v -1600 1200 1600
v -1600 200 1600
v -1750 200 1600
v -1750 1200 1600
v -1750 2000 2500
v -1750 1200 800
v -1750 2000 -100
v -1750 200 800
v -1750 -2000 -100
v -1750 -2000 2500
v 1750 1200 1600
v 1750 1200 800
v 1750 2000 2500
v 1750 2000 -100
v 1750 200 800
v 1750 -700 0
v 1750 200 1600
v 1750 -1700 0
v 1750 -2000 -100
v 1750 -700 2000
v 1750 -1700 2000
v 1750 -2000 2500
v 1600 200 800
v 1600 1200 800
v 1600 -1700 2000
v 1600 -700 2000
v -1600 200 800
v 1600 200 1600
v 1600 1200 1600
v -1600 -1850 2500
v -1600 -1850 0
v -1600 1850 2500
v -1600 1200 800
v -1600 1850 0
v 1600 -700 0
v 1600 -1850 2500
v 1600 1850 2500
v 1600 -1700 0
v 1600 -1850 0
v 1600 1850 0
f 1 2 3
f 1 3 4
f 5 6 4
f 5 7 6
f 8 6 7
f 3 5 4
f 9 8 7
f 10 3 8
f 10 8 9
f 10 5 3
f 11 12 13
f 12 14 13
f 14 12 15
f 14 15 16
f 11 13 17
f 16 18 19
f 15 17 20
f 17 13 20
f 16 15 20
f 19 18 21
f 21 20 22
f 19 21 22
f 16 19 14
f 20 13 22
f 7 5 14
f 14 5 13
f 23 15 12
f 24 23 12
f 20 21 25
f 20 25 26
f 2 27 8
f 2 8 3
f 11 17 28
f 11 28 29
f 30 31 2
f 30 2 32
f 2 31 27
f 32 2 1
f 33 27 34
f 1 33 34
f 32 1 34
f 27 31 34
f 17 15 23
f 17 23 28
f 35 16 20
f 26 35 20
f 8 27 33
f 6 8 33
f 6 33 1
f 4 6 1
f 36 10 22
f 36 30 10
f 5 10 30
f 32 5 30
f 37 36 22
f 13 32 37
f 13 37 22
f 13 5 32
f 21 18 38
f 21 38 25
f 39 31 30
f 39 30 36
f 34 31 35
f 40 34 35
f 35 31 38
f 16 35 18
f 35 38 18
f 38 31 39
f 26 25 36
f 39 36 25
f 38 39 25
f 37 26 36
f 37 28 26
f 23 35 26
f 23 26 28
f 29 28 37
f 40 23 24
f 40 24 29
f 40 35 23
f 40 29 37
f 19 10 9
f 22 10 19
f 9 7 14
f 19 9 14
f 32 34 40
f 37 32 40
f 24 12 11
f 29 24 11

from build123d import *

# Parameters (mm, degrees)
F0_W     = 3500
F0_H     = 4000
F0_W_2   = 3200
F0_H_2   = 3700
F1_DEPTH = 2500
F2_W     = 1000
F2_H     = 2000
F3_DEPTH = 150
F4_W     = 1000
F4_H     = 800
F5_DEPTH = 3500.001
F6_W     = 3500
F6_H     = 4000
F7_DEPTH = 100


with BuildPart() as f1:
    # F0 (on Top) → F1 (new body)
    with BuildSketch(Plane.XY):
        Rectangle(F0_W, F0_H)
        Rectangle(F0_W_2, F0_H_2, mode=Mode.SUBTRACT)
    extrude(amount=F1_DEPTH)

    # F2 (on face) → F3 (cut, through all)
    with BuildSketch(Plane.YZ.offset(1750)):
        with Locations((-1200, 1000)):
            Rectangle(F2_W, F2_H)
    extrude(amount=-F3_DEPTH, mode=Mode.SUBTRACT)

    # F4 (on face) → F5 (cut, through all)
    with BuildSketch(Plane.YZ.offset(1750)):
        with Locations((700, 1200)):
            Rectangle(F4_W, F4_H)
    extrude(amount=-F5_DEPTH, mode=Mode.SUBTRACT)

    # F6 (on face) → F7 (join)
    with BuildSketch(Plane(origin=(0, 0, 0), x_dir=(1, 0, 0), z_dir=(0, 0, -1))):
        Rectangle(F6_W, F6_H)
    extrude(amount=F7_DEPTH)


solid = f1.part
